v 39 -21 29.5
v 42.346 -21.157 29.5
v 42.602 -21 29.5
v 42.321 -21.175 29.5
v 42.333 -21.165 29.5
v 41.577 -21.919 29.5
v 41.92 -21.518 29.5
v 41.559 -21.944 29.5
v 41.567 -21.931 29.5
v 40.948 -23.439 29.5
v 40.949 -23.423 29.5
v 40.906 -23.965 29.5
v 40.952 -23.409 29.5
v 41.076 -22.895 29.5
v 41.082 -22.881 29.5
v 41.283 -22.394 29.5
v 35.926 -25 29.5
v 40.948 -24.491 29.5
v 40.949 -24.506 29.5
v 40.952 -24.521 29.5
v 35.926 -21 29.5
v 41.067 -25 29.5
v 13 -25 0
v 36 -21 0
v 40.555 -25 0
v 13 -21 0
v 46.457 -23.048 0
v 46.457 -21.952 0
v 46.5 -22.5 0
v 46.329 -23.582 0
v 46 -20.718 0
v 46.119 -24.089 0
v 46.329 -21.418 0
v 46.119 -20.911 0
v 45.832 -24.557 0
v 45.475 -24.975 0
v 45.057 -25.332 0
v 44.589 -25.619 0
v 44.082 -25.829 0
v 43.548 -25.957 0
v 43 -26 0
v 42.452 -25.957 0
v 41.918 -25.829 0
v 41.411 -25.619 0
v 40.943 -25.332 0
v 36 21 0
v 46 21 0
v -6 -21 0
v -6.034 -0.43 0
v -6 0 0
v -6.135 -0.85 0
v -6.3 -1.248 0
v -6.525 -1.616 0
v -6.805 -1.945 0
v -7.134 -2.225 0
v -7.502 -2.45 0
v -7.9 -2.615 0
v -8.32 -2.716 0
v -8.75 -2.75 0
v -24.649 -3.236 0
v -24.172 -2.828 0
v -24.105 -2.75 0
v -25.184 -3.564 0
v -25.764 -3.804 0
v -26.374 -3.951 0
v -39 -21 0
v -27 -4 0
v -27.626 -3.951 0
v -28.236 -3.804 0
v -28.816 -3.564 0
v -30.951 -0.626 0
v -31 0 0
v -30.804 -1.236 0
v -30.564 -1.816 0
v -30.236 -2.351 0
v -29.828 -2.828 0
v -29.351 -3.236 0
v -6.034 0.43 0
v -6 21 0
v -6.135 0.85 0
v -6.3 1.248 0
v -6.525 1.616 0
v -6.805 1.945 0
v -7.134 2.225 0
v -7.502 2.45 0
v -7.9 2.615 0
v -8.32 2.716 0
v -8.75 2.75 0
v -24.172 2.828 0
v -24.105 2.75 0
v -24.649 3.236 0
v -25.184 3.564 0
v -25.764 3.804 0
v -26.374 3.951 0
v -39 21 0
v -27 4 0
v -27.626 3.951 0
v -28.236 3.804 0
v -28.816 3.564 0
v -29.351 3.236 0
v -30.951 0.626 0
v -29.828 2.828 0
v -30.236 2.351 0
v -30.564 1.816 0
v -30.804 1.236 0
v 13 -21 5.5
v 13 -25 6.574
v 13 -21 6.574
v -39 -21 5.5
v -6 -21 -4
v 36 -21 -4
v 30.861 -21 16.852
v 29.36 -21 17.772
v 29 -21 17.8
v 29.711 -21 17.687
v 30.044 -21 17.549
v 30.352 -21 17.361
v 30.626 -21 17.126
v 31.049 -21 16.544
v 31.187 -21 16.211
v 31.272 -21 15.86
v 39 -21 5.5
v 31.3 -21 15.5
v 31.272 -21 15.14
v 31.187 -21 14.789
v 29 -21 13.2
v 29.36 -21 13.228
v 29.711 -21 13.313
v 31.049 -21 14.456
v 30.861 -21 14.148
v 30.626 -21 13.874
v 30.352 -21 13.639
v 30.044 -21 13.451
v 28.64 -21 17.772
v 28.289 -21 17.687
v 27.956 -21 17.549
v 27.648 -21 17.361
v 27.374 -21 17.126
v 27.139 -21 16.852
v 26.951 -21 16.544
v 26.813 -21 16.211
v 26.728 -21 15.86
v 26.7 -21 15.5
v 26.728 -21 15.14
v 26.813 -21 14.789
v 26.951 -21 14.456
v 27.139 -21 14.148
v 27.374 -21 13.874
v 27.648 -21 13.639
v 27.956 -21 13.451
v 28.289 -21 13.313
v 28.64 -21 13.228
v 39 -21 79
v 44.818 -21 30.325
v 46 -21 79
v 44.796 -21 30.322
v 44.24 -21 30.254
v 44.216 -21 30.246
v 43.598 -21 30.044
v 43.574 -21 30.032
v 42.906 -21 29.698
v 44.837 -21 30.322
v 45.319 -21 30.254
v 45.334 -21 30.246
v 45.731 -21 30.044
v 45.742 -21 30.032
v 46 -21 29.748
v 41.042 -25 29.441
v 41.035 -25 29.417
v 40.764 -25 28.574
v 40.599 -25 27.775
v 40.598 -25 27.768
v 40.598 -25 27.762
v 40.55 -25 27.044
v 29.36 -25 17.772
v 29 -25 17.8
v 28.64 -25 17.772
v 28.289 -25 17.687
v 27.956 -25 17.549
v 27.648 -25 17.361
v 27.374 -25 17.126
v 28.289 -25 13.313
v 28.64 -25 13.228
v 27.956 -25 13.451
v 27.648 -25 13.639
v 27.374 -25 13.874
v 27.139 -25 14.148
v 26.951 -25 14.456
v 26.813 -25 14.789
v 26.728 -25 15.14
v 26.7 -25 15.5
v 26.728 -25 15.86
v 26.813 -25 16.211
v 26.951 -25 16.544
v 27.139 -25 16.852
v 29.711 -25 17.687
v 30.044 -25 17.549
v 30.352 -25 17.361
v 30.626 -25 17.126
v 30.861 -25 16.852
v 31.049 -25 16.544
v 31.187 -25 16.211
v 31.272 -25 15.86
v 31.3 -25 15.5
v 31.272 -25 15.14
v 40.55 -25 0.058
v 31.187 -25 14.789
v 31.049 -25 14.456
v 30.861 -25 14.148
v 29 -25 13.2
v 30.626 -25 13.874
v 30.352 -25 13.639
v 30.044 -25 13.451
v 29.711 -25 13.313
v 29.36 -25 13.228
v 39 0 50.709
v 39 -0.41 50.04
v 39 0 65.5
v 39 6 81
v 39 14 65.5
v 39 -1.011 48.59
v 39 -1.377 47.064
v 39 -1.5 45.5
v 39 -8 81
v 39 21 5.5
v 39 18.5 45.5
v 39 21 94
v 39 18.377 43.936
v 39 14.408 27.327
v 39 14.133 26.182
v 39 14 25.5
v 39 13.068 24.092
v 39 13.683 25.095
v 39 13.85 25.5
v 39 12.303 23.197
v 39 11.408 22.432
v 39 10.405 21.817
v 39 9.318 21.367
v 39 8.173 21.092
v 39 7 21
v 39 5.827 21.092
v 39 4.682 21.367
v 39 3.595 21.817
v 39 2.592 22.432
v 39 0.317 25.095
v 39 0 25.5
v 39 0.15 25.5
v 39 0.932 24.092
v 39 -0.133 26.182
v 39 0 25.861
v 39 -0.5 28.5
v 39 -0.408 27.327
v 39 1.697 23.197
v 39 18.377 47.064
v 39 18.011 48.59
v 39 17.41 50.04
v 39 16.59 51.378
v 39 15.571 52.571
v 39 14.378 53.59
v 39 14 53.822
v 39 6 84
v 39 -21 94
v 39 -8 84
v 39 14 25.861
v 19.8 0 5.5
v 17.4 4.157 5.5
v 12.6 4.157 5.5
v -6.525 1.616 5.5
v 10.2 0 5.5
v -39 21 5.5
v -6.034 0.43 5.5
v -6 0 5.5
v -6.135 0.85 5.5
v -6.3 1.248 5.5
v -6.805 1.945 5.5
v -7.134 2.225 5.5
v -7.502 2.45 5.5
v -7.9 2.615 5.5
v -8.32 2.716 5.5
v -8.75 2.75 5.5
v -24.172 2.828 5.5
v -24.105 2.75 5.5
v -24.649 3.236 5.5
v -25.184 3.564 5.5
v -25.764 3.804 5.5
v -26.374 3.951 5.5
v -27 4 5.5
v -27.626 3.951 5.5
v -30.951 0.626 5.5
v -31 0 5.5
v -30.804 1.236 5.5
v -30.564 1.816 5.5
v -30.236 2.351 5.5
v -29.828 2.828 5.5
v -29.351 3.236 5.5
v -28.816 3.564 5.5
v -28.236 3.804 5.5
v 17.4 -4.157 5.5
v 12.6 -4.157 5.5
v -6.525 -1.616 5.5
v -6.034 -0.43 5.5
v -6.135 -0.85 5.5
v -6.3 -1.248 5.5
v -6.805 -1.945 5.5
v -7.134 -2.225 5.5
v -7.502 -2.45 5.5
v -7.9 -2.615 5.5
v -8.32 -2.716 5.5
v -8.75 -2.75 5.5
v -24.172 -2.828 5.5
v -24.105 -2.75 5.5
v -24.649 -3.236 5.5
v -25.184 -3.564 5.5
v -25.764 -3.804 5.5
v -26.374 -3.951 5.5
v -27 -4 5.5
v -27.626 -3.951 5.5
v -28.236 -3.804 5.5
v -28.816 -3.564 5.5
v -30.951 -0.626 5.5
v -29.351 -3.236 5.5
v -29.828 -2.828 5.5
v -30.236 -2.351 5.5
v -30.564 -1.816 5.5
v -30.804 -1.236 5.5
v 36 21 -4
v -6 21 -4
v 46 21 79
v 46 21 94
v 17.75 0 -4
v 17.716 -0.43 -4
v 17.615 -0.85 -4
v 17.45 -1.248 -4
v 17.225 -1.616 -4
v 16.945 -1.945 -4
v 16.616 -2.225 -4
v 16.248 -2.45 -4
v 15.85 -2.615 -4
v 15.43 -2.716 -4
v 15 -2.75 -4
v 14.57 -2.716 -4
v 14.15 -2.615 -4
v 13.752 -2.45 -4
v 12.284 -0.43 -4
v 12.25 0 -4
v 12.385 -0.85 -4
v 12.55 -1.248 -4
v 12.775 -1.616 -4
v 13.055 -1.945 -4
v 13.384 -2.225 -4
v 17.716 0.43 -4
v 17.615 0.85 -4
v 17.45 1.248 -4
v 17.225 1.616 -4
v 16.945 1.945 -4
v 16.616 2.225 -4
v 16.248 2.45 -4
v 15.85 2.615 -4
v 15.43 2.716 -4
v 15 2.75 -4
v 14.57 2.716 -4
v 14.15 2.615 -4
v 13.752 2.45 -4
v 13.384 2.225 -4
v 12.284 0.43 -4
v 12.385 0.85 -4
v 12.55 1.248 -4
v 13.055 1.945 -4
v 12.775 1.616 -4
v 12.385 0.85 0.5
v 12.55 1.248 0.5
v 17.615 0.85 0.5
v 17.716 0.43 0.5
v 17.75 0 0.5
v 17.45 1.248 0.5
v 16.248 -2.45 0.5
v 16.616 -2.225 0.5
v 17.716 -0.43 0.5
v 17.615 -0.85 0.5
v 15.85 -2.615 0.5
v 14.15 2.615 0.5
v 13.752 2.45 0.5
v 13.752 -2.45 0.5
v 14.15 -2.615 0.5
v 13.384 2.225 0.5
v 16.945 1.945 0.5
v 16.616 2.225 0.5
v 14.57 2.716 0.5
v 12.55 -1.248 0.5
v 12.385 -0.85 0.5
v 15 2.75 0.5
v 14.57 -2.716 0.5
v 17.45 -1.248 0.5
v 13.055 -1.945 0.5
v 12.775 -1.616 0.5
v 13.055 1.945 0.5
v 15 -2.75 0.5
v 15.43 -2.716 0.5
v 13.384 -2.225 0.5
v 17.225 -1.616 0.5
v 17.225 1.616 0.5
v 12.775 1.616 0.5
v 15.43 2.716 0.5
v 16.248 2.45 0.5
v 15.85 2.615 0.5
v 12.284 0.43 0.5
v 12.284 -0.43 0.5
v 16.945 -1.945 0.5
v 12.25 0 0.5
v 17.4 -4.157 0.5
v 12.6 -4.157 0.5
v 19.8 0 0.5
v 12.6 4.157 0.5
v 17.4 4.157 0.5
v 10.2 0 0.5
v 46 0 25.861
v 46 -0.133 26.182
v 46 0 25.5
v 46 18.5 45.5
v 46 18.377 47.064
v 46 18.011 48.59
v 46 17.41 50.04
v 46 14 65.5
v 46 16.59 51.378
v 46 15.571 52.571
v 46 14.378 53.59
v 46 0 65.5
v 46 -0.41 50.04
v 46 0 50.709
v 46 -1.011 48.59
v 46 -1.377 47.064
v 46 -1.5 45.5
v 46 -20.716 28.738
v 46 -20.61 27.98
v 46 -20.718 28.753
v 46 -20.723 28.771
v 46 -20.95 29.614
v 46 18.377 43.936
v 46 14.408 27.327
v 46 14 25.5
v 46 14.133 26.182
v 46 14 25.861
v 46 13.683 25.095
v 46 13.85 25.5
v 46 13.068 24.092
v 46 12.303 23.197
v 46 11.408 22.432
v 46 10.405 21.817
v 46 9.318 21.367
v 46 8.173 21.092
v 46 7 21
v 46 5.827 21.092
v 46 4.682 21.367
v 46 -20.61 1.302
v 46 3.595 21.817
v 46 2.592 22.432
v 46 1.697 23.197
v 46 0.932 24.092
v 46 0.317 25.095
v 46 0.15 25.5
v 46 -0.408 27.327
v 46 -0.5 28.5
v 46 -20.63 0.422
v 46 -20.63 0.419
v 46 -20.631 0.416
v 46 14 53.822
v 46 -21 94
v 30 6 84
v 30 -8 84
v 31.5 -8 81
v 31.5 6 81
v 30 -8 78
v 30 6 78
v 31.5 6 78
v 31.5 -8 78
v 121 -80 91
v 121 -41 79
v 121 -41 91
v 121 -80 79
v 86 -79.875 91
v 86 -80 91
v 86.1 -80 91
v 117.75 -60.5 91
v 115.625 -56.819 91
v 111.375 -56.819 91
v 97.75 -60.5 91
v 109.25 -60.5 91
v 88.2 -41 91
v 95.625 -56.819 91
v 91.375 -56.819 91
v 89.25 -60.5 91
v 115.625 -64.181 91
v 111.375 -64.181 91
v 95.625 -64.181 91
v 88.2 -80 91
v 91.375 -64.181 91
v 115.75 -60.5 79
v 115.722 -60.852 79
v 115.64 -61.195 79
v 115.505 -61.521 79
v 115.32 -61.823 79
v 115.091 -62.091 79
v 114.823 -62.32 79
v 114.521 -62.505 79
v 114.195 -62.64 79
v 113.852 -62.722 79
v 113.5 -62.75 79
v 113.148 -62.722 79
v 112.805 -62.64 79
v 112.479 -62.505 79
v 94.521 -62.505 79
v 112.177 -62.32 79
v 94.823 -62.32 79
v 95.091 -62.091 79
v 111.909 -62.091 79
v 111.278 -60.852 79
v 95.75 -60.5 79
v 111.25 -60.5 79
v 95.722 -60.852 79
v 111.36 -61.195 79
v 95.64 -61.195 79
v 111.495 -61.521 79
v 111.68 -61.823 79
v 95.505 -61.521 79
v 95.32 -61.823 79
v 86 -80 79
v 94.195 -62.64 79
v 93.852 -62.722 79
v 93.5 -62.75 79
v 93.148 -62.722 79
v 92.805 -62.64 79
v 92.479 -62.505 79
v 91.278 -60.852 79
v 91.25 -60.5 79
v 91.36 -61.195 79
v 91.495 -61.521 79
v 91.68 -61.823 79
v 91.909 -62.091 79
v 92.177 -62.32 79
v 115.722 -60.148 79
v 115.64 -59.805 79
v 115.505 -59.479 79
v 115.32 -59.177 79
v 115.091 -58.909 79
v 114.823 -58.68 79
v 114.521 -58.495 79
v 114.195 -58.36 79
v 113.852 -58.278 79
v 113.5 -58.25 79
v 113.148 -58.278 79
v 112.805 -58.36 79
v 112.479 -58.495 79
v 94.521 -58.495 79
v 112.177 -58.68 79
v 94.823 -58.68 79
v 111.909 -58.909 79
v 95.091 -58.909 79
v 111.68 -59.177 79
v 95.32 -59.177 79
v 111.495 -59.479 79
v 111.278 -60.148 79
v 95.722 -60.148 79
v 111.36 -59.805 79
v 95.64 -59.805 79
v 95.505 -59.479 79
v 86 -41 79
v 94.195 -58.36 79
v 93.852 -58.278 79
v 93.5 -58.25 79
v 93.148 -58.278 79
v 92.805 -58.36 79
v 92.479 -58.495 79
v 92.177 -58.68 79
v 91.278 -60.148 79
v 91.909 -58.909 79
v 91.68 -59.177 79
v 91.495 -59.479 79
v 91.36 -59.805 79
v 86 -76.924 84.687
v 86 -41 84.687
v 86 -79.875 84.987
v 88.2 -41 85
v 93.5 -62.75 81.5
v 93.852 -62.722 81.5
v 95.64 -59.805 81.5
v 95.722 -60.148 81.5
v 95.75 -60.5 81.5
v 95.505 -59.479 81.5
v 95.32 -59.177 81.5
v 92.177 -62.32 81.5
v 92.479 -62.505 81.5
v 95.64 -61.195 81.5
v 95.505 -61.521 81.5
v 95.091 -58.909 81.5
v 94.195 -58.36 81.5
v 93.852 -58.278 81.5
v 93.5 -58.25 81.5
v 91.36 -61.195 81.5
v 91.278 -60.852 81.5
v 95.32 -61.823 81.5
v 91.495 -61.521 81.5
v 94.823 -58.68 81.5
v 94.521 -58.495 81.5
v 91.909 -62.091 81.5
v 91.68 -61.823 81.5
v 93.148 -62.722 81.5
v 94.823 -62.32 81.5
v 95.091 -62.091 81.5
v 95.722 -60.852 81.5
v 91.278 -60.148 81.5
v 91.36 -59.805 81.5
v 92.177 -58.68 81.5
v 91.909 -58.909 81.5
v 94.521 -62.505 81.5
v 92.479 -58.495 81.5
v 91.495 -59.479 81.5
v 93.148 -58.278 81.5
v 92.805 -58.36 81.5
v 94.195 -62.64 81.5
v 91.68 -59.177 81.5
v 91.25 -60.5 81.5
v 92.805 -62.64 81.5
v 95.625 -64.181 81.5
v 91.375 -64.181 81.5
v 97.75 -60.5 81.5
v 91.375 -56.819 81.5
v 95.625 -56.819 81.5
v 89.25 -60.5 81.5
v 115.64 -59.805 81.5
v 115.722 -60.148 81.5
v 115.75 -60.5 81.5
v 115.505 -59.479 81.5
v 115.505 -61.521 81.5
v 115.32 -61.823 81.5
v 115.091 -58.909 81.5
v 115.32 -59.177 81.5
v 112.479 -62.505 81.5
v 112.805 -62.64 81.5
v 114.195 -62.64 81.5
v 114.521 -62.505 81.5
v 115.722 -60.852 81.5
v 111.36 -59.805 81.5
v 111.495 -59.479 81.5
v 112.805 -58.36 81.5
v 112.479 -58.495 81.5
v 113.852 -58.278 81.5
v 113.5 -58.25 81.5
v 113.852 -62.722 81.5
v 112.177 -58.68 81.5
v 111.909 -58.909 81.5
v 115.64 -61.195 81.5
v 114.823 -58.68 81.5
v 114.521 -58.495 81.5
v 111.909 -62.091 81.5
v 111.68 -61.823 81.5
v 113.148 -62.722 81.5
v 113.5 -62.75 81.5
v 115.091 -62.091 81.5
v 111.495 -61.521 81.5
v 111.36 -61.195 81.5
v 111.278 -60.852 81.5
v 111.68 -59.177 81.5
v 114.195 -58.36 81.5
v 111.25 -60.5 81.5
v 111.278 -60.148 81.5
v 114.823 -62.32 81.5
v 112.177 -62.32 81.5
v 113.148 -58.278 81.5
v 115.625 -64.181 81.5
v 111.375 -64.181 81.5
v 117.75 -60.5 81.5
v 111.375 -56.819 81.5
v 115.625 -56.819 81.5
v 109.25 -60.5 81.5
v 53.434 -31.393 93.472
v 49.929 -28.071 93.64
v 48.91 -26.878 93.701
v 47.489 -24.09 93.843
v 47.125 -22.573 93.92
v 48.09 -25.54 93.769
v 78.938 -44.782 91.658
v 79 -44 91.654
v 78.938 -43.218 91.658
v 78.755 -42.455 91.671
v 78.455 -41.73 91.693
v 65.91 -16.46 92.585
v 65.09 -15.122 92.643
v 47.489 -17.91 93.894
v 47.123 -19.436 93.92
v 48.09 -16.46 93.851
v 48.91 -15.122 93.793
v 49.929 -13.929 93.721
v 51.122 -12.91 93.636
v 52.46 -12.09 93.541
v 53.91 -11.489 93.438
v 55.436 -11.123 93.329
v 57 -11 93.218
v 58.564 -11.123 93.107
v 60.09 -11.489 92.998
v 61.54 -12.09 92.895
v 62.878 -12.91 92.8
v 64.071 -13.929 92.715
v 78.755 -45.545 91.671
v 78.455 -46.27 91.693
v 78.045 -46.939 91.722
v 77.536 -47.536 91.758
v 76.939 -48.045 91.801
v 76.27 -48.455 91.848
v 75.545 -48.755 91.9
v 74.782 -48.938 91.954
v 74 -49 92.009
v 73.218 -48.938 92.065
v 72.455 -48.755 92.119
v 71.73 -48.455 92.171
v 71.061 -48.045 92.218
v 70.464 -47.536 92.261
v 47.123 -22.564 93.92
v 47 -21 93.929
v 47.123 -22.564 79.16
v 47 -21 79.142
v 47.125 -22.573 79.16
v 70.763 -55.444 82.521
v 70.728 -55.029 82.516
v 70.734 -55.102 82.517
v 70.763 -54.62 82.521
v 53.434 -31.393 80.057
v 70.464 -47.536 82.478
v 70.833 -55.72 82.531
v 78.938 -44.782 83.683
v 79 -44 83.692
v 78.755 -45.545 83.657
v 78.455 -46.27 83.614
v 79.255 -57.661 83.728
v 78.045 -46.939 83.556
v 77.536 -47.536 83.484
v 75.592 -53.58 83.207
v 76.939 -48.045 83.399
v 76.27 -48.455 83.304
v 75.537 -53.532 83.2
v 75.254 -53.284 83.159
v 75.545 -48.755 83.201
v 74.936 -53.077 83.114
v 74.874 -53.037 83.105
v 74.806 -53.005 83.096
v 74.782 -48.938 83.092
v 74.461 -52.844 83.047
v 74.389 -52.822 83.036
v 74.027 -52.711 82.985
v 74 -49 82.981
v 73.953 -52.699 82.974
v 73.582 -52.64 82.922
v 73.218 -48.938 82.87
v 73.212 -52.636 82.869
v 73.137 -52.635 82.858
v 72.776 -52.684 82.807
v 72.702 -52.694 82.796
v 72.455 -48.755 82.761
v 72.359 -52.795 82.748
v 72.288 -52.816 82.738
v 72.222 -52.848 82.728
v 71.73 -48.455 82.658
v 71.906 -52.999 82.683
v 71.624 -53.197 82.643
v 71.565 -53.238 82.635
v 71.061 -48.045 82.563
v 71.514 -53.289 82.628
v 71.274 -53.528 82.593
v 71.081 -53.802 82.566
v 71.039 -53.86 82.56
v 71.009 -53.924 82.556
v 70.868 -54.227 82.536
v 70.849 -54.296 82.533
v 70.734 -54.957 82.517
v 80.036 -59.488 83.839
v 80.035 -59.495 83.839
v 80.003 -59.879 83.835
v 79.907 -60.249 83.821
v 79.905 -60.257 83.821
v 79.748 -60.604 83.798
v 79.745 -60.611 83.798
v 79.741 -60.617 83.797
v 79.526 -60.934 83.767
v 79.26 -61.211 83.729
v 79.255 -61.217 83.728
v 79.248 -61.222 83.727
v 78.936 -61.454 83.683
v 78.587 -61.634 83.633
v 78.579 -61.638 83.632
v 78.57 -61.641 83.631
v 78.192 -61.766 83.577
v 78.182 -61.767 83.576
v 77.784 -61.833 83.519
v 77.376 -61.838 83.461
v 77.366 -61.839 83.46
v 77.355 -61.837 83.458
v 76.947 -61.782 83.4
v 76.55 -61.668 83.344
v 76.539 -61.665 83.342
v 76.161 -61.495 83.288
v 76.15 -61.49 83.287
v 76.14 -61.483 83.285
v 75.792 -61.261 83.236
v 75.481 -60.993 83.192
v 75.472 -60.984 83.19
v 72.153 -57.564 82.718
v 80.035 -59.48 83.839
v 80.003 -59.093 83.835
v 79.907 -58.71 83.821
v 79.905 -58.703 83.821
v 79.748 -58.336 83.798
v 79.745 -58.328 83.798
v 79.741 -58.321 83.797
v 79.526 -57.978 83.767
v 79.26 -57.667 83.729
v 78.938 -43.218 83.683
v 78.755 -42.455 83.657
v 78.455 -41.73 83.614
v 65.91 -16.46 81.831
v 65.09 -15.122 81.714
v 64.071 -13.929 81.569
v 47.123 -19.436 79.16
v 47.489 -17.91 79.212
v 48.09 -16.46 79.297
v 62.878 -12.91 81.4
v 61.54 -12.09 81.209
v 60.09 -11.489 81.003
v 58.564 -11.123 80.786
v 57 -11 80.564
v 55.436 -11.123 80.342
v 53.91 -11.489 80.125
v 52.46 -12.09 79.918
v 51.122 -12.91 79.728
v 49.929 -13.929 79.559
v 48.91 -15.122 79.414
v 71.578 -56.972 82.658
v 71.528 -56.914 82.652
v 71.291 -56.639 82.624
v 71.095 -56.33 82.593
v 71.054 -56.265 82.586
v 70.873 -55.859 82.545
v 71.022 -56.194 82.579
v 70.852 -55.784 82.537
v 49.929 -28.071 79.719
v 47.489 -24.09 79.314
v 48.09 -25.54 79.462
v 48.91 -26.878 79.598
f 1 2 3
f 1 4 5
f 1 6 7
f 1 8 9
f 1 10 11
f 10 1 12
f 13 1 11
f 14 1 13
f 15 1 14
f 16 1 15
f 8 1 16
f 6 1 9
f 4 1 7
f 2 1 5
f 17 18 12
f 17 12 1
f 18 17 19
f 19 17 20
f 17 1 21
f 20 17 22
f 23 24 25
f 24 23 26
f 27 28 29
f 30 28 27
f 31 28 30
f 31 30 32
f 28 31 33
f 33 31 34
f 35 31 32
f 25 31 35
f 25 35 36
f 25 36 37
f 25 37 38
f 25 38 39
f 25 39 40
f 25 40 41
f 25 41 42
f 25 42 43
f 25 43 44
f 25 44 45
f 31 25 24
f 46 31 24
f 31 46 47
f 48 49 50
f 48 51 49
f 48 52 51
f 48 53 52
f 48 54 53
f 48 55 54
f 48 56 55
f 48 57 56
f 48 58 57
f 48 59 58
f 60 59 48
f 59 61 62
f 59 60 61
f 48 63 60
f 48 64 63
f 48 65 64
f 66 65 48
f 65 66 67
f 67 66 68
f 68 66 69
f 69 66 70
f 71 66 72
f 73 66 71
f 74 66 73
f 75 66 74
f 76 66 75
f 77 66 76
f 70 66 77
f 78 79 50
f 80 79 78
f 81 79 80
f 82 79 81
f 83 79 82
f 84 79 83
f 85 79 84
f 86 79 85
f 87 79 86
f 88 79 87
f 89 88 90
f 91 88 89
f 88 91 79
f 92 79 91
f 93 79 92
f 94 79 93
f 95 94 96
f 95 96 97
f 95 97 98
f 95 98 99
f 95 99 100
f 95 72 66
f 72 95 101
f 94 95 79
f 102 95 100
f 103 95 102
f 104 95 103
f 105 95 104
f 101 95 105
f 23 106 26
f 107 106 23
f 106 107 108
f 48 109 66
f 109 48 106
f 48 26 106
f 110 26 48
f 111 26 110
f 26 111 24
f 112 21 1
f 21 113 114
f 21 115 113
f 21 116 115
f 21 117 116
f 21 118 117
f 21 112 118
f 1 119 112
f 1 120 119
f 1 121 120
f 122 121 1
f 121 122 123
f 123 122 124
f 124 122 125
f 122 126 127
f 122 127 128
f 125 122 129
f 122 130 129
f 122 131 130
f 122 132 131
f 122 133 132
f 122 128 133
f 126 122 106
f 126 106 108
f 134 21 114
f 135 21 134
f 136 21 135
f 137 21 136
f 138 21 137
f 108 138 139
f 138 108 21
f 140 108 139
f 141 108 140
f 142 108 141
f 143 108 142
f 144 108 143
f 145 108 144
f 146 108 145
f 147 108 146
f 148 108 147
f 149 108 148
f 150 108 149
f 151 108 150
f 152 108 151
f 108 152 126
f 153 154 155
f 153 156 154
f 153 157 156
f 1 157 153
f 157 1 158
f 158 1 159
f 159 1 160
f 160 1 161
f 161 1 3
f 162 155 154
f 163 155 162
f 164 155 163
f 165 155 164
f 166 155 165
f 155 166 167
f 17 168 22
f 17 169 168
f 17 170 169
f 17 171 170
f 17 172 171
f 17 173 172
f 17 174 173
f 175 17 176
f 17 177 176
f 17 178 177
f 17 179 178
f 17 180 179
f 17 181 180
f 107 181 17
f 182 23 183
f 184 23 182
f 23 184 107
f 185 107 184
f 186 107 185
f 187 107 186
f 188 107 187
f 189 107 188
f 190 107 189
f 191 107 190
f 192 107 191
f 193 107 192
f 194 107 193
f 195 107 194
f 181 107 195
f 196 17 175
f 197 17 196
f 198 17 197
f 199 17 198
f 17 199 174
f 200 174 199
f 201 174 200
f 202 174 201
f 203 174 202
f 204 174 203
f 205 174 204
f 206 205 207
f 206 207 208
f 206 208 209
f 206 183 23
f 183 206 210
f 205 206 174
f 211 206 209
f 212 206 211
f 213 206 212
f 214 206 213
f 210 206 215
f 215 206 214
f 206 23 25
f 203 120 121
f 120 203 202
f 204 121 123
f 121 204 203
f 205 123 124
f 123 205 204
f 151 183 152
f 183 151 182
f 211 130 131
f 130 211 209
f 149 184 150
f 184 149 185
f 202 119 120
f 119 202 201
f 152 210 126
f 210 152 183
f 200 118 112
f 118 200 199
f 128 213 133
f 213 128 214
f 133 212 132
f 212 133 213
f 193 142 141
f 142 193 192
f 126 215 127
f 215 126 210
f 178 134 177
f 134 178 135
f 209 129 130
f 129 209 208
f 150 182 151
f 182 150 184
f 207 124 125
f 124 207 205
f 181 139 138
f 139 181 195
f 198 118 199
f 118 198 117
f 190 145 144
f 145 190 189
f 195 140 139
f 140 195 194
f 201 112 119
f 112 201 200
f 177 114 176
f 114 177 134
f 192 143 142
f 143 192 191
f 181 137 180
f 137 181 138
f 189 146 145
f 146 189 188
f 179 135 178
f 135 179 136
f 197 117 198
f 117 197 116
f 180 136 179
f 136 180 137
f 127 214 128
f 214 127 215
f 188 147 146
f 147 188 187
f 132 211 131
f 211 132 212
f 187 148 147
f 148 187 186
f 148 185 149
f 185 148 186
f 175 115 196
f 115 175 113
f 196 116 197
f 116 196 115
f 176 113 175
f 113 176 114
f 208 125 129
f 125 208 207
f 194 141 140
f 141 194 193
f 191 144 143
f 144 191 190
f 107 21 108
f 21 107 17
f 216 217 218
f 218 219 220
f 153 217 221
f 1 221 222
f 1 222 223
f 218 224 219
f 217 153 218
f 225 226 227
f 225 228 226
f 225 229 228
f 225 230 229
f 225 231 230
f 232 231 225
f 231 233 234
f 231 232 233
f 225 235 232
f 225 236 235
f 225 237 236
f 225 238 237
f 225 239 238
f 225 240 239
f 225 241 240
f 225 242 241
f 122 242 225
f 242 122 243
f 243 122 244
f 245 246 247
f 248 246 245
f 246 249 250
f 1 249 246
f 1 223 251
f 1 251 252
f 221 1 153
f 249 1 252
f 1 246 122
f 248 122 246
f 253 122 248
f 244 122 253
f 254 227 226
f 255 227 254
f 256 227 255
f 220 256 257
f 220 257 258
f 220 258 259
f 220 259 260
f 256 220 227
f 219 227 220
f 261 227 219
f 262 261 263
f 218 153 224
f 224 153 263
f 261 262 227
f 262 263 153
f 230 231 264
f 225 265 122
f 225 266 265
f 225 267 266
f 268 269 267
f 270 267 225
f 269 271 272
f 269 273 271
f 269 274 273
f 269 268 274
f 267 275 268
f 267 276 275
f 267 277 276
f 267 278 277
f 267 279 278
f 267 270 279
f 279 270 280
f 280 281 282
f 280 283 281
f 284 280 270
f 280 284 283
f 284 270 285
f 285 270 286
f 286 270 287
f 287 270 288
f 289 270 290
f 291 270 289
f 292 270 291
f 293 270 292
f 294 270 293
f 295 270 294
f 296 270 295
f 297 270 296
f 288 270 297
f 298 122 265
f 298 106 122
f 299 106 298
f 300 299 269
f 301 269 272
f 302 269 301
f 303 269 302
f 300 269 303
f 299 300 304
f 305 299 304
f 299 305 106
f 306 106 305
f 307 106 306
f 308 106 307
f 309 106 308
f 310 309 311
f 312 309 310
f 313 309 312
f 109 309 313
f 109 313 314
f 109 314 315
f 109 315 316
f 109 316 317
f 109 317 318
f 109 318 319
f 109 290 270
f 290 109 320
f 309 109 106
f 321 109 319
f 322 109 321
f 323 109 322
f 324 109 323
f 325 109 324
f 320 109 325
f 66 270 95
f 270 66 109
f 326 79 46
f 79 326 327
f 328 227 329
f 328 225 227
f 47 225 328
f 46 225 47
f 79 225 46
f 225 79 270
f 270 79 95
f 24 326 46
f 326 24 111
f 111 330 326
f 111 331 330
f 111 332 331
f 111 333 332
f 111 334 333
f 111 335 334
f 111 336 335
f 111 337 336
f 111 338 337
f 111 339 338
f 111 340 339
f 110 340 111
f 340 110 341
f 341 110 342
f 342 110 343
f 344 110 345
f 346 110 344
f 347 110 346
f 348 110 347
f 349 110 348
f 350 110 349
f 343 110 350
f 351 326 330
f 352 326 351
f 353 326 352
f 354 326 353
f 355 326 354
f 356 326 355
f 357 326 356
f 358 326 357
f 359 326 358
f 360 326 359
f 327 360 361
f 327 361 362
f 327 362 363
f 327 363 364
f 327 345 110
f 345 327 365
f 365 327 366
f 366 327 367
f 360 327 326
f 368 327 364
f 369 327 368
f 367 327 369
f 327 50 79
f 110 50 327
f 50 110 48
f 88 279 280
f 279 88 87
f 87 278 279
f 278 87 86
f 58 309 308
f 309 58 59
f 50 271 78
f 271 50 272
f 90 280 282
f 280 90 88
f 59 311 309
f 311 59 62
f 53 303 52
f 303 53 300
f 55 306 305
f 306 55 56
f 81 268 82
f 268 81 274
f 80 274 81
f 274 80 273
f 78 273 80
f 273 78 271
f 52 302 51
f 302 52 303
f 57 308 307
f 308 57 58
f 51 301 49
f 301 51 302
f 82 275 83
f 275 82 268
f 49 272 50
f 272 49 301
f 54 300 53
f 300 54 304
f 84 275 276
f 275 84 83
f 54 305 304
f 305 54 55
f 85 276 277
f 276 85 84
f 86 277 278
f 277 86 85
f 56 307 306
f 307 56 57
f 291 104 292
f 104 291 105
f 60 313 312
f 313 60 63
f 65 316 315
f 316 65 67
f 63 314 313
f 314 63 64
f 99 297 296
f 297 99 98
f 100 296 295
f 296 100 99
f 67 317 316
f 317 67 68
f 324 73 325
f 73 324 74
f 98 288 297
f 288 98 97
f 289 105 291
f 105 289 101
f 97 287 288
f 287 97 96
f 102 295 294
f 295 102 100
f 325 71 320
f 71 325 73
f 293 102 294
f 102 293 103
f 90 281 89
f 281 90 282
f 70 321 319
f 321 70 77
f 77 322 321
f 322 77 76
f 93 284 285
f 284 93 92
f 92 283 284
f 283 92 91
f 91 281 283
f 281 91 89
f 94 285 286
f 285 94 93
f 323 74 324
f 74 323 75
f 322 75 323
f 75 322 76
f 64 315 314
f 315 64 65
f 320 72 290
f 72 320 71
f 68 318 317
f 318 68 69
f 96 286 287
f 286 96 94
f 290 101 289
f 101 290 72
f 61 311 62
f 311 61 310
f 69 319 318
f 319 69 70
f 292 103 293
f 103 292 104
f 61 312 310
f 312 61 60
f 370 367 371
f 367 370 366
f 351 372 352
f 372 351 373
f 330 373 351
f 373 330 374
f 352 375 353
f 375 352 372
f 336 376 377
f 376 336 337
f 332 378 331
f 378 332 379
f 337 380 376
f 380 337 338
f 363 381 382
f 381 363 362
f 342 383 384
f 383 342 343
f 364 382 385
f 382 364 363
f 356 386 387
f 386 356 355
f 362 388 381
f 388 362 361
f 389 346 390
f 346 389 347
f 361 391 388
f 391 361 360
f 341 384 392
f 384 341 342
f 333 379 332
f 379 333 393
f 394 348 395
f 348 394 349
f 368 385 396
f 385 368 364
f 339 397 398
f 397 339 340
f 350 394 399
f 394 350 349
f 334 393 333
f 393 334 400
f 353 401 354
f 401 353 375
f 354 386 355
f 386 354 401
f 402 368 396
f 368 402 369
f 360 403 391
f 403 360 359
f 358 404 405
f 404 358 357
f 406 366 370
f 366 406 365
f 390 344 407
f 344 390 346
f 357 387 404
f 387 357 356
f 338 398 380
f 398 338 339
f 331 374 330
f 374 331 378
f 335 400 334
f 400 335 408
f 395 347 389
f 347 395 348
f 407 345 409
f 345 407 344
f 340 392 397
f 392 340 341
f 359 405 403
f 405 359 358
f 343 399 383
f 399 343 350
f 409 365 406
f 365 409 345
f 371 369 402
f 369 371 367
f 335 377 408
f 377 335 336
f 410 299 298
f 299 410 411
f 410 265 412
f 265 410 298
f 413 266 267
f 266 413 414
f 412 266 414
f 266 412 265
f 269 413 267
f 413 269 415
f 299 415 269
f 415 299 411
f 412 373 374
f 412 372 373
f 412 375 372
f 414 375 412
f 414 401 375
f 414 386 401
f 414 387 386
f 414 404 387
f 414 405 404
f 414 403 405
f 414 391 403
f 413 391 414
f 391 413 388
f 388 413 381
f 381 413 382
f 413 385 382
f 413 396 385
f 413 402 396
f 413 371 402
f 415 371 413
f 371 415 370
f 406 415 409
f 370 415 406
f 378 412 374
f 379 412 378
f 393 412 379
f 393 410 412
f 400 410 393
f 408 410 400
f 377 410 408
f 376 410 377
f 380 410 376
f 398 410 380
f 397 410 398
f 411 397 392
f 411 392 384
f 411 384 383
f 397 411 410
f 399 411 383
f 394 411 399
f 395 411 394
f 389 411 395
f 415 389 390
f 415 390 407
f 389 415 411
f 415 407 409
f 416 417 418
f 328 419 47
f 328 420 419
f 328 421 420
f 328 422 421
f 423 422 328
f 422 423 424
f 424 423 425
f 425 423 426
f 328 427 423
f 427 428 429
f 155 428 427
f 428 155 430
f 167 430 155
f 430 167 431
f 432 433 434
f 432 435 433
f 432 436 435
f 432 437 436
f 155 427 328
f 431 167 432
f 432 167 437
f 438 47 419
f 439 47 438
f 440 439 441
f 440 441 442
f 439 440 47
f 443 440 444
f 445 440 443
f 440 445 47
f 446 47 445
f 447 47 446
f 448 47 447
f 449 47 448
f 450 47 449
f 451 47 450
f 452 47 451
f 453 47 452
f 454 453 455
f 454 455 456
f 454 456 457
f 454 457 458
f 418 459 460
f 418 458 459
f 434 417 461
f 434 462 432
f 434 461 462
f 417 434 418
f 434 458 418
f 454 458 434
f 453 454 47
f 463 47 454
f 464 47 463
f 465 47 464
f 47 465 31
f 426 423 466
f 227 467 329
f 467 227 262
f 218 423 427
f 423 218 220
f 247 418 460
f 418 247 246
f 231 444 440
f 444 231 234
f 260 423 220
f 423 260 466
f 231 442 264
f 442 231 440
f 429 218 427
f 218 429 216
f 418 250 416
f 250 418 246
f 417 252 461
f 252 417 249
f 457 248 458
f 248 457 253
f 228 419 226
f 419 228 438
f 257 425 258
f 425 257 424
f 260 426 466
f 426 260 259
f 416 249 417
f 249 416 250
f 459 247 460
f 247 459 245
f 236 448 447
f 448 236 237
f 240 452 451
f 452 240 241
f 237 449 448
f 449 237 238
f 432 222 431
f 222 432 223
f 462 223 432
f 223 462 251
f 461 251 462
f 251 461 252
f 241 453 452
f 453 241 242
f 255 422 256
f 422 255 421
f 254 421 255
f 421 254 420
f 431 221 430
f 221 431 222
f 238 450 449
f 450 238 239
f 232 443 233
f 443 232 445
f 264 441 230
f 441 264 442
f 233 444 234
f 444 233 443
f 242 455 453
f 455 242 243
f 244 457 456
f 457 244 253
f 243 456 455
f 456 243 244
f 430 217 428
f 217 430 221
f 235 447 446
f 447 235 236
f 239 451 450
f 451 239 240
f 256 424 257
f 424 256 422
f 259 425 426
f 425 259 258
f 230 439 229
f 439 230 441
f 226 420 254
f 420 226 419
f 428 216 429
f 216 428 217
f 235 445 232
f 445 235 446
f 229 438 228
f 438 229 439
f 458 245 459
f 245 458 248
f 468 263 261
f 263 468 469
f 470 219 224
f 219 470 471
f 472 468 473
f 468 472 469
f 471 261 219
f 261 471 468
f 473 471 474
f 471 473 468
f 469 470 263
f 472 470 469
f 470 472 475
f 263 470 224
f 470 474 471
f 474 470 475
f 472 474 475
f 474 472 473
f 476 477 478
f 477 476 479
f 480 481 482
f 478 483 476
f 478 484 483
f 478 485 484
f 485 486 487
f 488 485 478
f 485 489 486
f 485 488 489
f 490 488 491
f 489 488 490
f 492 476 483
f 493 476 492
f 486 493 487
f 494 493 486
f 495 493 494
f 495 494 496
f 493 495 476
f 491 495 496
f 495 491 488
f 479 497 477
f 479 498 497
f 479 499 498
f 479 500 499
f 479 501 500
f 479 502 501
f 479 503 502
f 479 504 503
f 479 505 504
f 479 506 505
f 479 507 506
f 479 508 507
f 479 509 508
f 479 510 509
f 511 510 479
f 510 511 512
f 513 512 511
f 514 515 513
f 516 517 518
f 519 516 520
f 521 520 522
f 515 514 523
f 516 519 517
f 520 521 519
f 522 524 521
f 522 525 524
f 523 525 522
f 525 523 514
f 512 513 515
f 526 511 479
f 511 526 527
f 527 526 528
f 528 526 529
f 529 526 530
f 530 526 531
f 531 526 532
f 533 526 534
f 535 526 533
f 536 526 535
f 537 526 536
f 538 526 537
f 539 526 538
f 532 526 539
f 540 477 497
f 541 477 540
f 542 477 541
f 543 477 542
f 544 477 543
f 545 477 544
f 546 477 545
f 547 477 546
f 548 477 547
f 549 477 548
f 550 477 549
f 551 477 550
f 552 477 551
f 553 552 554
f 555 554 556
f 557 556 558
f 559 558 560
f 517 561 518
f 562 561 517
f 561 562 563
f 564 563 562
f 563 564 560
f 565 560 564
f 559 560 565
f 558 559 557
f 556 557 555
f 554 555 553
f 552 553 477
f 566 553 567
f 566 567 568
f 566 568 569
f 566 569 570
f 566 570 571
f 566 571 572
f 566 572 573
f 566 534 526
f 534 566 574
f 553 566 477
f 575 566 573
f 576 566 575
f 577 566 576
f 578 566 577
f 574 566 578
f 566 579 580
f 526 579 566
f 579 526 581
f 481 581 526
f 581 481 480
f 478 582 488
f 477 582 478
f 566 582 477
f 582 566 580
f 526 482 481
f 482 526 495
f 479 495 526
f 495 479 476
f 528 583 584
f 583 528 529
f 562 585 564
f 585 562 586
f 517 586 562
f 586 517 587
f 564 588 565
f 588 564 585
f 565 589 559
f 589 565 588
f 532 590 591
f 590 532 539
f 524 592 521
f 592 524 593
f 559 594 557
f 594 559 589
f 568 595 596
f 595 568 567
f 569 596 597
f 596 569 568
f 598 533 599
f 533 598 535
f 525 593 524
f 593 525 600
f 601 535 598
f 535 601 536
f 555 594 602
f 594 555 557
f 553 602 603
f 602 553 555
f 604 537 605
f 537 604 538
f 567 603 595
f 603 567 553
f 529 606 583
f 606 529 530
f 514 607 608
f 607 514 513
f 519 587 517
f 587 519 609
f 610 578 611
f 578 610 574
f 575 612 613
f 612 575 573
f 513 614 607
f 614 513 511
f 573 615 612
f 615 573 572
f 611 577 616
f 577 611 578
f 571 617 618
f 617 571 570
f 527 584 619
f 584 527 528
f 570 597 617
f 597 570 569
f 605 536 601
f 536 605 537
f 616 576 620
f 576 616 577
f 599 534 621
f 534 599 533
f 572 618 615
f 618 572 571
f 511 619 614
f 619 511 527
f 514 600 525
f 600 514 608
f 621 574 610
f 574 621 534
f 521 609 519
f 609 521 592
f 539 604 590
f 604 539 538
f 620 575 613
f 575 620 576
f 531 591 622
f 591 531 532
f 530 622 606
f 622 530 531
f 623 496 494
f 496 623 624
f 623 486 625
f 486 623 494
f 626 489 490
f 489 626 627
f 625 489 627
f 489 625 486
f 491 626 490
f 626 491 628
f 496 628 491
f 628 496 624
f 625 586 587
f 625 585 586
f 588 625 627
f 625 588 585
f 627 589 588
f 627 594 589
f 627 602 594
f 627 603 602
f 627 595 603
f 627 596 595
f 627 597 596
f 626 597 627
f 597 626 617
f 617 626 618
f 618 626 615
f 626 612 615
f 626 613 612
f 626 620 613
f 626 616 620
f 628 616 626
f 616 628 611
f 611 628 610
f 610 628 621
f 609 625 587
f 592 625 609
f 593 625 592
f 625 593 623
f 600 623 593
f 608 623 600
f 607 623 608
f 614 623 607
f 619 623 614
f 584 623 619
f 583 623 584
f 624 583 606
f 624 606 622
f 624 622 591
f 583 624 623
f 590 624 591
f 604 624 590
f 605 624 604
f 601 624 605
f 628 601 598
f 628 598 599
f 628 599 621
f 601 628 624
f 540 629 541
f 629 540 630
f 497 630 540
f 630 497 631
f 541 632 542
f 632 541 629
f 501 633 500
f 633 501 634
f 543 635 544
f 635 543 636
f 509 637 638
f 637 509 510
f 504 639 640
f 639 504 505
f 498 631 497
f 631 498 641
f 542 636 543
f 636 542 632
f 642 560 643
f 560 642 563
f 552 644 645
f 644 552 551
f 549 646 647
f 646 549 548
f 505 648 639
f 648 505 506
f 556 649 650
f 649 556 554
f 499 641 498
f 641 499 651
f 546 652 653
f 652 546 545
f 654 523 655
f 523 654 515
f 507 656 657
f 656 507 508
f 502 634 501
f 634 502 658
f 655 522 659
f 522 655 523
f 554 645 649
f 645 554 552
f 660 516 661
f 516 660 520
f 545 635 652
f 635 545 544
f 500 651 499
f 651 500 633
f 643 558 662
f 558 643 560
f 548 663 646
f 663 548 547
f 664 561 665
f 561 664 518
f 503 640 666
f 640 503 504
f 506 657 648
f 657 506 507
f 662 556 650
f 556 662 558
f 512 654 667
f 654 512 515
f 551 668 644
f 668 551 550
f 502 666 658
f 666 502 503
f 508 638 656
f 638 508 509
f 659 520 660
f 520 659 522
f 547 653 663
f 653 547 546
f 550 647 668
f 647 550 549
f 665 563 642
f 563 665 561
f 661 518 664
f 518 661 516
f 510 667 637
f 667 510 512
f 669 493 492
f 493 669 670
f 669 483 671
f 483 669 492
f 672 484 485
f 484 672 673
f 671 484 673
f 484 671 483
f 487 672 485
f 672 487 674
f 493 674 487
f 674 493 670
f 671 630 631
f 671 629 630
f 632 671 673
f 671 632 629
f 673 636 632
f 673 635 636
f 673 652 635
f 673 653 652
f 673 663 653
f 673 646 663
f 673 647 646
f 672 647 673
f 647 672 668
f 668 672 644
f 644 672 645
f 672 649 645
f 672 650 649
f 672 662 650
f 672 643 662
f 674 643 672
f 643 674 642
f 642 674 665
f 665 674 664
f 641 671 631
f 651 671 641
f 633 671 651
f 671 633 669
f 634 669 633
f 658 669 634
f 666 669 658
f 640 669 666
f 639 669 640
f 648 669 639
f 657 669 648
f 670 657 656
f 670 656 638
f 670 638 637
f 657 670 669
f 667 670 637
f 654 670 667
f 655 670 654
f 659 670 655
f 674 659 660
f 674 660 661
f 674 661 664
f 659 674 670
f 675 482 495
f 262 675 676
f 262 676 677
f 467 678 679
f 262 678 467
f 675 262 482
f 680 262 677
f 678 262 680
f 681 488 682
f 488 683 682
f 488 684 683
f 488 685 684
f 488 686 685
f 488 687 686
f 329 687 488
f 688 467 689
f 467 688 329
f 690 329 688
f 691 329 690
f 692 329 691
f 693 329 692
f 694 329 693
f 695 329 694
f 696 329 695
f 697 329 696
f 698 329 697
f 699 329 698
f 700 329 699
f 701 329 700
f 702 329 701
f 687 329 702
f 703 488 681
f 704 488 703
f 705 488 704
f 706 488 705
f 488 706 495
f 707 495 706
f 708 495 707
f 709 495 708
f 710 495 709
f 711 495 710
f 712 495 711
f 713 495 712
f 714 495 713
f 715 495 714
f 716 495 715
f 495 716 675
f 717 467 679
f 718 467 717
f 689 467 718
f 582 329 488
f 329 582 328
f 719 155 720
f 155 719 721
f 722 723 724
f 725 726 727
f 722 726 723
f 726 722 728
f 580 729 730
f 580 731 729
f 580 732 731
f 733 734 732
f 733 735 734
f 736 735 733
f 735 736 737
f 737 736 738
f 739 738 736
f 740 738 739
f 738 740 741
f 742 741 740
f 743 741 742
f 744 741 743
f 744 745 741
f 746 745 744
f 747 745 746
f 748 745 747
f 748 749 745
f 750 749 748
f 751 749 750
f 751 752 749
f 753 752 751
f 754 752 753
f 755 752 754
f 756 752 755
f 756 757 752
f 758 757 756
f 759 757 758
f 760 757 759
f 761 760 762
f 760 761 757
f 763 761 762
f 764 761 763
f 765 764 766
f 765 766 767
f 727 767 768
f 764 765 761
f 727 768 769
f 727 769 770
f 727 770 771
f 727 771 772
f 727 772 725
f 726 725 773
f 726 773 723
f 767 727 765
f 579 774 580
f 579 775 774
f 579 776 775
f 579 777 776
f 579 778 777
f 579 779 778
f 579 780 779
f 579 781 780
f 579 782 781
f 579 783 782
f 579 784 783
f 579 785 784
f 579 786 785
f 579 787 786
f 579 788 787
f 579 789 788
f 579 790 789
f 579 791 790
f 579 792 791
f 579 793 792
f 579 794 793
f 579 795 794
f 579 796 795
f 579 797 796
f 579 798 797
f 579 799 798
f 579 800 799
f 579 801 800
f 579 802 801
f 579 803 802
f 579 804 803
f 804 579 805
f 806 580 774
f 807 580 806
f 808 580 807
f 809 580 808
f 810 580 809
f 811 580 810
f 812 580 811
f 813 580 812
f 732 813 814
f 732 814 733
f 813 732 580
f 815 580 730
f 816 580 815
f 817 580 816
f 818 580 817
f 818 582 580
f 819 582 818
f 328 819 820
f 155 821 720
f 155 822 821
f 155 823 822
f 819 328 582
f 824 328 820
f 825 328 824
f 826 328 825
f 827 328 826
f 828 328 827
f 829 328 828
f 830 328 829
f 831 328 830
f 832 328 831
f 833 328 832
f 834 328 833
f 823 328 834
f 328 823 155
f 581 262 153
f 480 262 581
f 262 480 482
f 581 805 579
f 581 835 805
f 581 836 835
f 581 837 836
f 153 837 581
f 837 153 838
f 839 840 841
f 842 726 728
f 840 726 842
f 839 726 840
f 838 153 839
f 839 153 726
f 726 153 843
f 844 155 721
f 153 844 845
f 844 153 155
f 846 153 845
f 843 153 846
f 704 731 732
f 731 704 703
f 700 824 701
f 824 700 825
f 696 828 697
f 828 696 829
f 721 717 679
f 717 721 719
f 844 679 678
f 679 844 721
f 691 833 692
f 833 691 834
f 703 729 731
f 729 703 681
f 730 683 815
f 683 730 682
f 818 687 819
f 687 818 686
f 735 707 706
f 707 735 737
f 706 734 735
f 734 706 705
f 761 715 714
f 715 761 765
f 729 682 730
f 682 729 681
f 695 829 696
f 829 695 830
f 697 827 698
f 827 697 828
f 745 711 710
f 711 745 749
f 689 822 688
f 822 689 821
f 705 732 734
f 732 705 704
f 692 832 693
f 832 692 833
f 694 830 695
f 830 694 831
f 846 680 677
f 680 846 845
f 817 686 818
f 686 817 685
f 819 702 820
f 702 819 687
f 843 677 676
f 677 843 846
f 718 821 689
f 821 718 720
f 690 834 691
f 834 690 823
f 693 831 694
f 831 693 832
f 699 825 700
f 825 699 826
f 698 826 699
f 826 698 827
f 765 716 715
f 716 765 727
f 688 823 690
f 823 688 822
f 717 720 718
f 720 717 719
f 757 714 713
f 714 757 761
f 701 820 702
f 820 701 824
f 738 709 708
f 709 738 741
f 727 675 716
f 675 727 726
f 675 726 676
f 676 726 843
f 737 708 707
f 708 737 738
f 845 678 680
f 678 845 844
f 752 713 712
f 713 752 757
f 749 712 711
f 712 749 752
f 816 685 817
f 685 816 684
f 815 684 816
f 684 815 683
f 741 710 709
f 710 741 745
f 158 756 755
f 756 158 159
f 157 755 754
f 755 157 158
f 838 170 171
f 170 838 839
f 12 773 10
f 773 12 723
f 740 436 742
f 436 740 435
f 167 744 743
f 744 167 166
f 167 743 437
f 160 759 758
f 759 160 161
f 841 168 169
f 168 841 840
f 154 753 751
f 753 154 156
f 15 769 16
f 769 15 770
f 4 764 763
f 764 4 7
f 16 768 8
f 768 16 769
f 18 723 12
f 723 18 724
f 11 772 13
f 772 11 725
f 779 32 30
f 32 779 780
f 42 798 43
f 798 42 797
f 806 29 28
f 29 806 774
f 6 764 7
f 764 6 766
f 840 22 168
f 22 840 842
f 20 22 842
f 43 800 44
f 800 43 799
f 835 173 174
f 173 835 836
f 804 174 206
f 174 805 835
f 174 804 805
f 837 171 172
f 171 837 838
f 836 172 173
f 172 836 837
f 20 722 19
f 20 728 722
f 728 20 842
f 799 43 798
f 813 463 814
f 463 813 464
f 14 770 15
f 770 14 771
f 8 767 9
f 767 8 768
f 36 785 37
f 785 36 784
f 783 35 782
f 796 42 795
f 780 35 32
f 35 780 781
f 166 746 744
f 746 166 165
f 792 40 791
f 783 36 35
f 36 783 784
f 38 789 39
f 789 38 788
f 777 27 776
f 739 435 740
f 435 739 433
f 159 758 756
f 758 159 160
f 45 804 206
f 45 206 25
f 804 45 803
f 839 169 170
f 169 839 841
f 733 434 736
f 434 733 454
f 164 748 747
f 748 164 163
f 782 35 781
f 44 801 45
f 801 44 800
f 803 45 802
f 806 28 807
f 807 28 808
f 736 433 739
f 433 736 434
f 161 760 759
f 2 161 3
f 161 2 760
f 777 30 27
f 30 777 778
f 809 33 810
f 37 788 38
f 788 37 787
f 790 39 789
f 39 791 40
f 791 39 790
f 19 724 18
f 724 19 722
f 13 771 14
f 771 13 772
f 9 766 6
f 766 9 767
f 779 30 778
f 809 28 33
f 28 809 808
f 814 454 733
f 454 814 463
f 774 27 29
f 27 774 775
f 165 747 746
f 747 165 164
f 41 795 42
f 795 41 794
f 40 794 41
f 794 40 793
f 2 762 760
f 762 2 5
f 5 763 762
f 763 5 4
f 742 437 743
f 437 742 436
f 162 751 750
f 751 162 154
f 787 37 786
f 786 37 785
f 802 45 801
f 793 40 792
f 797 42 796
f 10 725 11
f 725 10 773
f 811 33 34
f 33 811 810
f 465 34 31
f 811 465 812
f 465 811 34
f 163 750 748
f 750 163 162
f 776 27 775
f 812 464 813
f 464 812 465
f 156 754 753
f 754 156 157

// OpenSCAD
$fn = 40;

basePlateLength = 78;
basePlateWidth = 42;
basePlateThick = 5.5;

verticalPlateHeight = 94;
verticalPlateThick = 7;

supportPlateLength = 39;
supportPlateWidth = 35;
supportPlateThick = 12;
supportPlateOffetX = 50;
supportPlateOffsetY = -20;

ScrewDistance = 20;

fingerHeight =89;
fingerLength = 8.5;
fingerThick = 3;
fingerTeeth = fingerThick + 3;

module photoScrewHole(length, height, bigDiameter, smallDiameter)
{
    union()
    {
        hull()
        {
            cylinder(h=height, d=smallDiameter);
            translate([length - (bigDiameter/2 + smallDiameter/ 2), 0, 0])
            cylinder(h=height, d=smallDiameter);
        }
    translate([0,0,0])
    cylinder(h=height, d=bigDiameter);
    }
}

module base()
{
    union()
    {
        // Base Plate
        difference()
        {
            union()
            {
                translate([-basePlateLength/2, -basePlateWidth/2, 0])
                cube([basePlateLength, basePlateWidth, basePlateThick]);
                
                translate([-42/2 + 15,-42/2,-4])
                cube([42,42,4]);
                
                // Blocking hole
                difference()
                {
                    translate([basePlateLength/2-20 - supportPlateThick+6,
                            -basePlateWidth/2 - 4,
                            0])
                    cube([20 + supportPlateThick, 4, basePlateThick + 4 + 20]);
                    
                    translate([basePlateLength/2-10,-10,10 + basePlateThick])
                    rotate([90,0,0])
                    cylinder(h=20, d=4.6);
                    
                    translate([-10,-basePlateWidth/2 - 6,26])
                    rotate([0,45,0])
                    cube([30, 10, 60]);
                }
            }
            // Hole for the photo screw
            translate([-basePlateLength/2 + 12, 0, -1])
            photoScrewHole(length=25, height=20, bigDiameter=8, smallDiameter=5.5);
            
            // hole for photo plate screw
            translate([15, 0, 0])
            union()
            {
                translate([0, 0, -20])
                cylinder(h=40, d=5.5);
                
                translate([0, 0, basePlateThick-5])
                cylinder(h=40, d=9.6, $fn=6);
            }
        
        }
        union()
        {
            difference()
            {
                translate([basePlateLength/2, -basePlateWidth/2, 0])
                cube([verticalPlateThick, basePlateWidth, verticalPlateHeight]);
                
                translate([basePlateLength/2 - 1, 0, 20 + basePlateThick])
                cube([verticalPlateThick + 2, 14, 40]);
            
                hull()
                {
                    translate([30, 7 + 1.5, basePlateThick + 30 - 10 + 20])
                    rotate([0,90,0])
                    cylinder(h=30, d=20);
                    
                    translate([30, 7, basePlateThick + 30 - 7])
                    rotate([0,90,0])
                    cylinder(h=30, d=15);
                }
            }
            // finger
            
            translate([basePlateLength/2 - 9, -8,fingerHeight - 8])
            union()
            {
                cube([fingerLength+1, 14,3]);
                translate([0,0,-fingerTeeth +3])
                cube([1.5, 14, fingerTeeth]);
            }
        }
    }
}

module support()
{
union()
    {
      translate([supportPlateOffetX + supportPlateWidth/2, supportPlateOffsetY - supportPlateLength/2, 0])
      difference()
        {
    
            
            //translate([ScrewDistance, 0, 0])
            //cylinder(h=supportPlateThick + 3, d=4);
            translate([-supportPlateWidth/2, -supportPlateLength/2, 0])
            cube([supportPlateWidth,supportPlateLength,supportPlateThick]);  
            
            // Screws
            translate([-ScrewDistance/2, 0, -1.5])
            cylinder(h=supportPlateThick + 3, d=4.5);
            translate([-ScrewDistance/2, 0, 2.5])
            cylinder(h=supportPlateThick + 3, d=8.5, $fn=6);
            
            translate([ScrewDistance/2, 0, -1.5])
            cylinder(h=supportPlateThick + 3, d=4.5);
            translate([ScrewDistance/2, 0, 2.5])
            cylinder(h=supportPlateThick + 3, d=8.5, $fn=6);
        
         }
     difference()
         {
         hull()
             {
             translate([supportPlateOffetX + supportPlateWidth/2, supportPlateOffsetY - supportPlateLength/2, 0])
             translate([-supportPlateWidth/2 + 0.1, -supportPlateLength / 2, supportPlateThick - 6])
             cube([2.1, supportPlateLength, 6]);
             
             translate([verticalPlateThick / 2 - 0.5,0,0])
             cube([verticalPlateThick, basePlateWidth, 15]);    
             }
         hull()
             {
                 translate([21,0,0])
                 cylinder(h=30, d=20);
                     
                 translate([38,-23,0])
                 cylinder(h=30, d=10);
             }
        }
     hull()
         {
             translate([supportPlateOffetX - 8, supportPlateOffsetY - supportPlateLength + 20, supportPlateThick - 6])
             cylinder(h=6, d=5);
             //cube([3,10,6]);
             translate([7,verticalPlateThick/2 - 5,-verticalPlateHeight + 15])
             cylinder(h=27, d=verticalPlateThick);
             //cube([verticalPlateThick,5,15]);
         }
    }
}

//photoScrewHole(20, 20, 10, 5);

difference()
{
    union()
    {
        base();
        translate([basePlateLength/2+ verticalPlateThick - 2 -8, -basePlateWidth/ 2, verticalPlateHeight - 15])
        support();
    }
    translate([basePlateLength/2 + 9,0,verticalPlateHeight+0.1])
    rotate([0,180,180])
    scale([0.06, 0.06, 0.01])
    //cube(10,10.5);
    surface(file = "logo_small.png", center = true, invert = false);
}
